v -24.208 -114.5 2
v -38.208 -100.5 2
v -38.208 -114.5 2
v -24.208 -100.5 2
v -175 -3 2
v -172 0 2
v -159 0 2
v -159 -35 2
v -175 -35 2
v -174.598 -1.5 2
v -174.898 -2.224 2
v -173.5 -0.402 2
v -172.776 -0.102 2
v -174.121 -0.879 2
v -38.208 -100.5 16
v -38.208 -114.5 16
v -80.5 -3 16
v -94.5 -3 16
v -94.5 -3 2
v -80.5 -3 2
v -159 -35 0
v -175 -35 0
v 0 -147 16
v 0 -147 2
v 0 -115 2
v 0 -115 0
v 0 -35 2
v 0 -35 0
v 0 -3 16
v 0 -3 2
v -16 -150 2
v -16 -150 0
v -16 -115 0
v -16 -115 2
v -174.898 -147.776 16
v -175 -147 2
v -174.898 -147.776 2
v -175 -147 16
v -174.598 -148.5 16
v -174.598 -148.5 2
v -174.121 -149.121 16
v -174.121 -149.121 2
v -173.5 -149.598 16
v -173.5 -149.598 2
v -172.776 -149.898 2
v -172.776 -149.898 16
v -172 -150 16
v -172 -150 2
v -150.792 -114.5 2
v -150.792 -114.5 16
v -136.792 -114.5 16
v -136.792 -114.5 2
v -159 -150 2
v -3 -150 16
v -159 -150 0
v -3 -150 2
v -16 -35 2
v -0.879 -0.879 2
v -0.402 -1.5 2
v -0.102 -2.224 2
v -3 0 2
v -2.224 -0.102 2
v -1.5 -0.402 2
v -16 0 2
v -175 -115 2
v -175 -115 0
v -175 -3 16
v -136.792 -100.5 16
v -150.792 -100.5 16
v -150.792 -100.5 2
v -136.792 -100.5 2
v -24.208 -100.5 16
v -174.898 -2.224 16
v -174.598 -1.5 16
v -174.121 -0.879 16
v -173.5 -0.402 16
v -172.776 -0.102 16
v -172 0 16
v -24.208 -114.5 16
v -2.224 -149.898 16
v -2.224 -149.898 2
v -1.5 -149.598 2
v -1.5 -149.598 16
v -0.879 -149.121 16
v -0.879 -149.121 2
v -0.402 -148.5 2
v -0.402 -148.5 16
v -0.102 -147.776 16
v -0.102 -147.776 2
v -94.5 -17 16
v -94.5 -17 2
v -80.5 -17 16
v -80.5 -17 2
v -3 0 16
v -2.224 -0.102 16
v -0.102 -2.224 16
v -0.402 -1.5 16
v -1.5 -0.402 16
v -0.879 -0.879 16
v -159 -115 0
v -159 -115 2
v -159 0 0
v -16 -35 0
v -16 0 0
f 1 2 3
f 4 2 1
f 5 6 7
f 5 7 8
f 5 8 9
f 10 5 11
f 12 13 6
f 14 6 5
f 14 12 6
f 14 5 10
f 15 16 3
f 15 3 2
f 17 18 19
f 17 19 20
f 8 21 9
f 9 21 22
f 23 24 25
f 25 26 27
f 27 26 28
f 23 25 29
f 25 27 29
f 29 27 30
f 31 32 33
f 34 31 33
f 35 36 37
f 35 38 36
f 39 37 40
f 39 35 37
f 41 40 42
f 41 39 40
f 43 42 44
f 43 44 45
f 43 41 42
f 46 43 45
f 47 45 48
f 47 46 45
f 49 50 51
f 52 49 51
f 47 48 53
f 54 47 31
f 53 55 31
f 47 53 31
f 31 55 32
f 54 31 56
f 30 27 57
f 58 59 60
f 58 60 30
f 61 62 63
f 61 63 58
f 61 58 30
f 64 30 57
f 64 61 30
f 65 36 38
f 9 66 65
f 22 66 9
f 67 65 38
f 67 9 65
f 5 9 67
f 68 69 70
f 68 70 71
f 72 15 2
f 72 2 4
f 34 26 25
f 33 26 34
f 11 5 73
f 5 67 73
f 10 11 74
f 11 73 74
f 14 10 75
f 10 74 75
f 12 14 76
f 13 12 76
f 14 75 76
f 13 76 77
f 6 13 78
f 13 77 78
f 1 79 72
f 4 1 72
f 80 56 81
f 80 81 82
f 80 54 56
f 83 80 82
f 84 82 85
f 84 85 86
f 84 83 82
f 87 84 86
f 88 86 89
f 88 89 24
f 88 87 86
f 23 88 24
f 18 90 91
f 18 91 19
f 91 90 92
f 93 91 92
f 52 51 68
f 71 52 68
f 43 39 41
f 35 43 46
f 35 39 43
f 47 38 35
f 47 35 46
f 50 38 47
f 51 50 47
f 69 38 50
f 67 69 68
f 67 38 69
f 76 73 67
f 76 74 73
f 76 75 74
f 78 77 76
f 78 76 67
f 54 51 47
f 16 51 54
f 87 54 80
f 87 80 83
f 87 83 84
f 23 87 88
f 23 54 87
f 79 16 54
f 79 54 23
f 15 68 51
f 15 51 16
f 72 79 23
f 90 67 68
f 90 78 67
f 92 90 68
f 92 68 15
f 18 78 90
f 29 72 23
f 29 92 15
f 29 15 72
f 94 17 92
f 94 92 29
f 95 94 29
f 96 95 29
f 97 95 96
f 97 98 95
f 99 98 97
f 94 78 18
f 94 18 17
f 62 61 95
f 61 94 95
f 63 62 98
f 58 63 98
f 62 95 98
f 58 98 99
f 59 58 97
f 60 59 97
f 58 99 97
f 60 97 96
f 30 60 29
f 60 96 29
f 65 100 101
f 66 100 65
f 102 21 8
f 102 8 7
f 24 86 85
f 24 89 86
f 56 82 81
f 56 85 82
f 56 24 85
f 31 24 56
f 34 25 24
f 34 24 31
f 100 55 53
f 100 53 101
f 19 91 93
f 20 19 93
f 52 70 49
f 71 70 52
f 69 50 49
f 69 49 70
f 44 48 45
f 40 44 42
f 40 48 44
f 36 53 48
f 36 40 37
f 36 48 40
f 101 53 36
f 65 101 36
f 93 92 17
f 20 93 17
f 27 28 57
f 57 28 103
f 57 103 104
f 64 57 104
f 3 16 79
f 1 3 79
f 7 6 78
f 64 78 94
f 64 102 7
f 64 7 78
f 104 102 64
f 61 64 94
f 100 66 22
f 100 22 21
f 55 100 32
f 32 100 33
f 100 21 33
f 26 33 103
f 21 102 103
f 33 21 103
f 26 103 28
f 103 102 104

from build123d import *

# Parameters (mm, degrees)
SKETCH1_W           = 175
SKETCH1_H           = 150
BOSS_EXTRUDE1_DEPTH = 16
SKETCH2_W           = 14
SKETCH2_H           = 14
CUT_EXTRUDE1_DEPTH  = 14
SKETCH4_W           = 16
SKETCH4_H           = 35
CUT_EXTRUDE5_DEPTH  = 2
FILLET1_R           = 3


with BuildPart() as part:
    # Sketch1 → Boss-Extrude1 (new body)
    with BuildSketch(Plane.XY):
        with Locations((-87.5, -75)):
            Rectangle(SKETCH1_W, SKETCH1_H)
    extrude(amount=BOSS_EXTRUDE1_DEPTH)

    # Sketch2 → Cut-Extrude1 (cut)
    with BuildSketch(Plane.XY.offset(16)):
        with Locations((-87.5, -10)):
            Rectangle(SKETCH2_W, SKETCH2_H)
        with Locations((-143.791651246, -107.5)):
            Rectangle(SKETCH2_W, SKETCH2_H)
        with Locations((-31.208348754, -107.5)):
            Rectangle(SKETCH2_W, SKETCH2_H)
    extrude(amount=-CUT_EXTRUDE1_DEPTH, mode=Mode.SUBTRACT)

    # Sketch4 → Cut-Extrude5 (cut)
    with BuildSketch(Plane(origin=(0, 0, 0), x_dir=(-1, 0, 0), z_dir=(0, 0, -1))):
        with Locations((167, -17.5)):
            Rectangle(SKETCH4_W, SKETCH4_H)
        with Locations((167, -132.5)):
            Rectangle(SKETCH4_W, SKETCH4_H)
        with Locations((8, -132.5)):
            Rectangle(SKETCH4_W, SKETCH4_H)
        with Locations((8, -17.5)):
            Rectangle(SKETCH4_W, SKETCH4_H)
    extrude(amount=-CUT_EXTRUDE5_DEPTH, mode=Mode.SUBTRACT)

    # Fillet1
    fillet1_edges = [part.edges().sort_by_distance(p)[0] for p in [
        (0, -150, 9),
        (-175, -150, 9),
        (-175, 0, 9),
        (0, 0, 9),
    ]]
    fillet(fillet1_edges, radius=FILLET1_R)


solid = part.part
